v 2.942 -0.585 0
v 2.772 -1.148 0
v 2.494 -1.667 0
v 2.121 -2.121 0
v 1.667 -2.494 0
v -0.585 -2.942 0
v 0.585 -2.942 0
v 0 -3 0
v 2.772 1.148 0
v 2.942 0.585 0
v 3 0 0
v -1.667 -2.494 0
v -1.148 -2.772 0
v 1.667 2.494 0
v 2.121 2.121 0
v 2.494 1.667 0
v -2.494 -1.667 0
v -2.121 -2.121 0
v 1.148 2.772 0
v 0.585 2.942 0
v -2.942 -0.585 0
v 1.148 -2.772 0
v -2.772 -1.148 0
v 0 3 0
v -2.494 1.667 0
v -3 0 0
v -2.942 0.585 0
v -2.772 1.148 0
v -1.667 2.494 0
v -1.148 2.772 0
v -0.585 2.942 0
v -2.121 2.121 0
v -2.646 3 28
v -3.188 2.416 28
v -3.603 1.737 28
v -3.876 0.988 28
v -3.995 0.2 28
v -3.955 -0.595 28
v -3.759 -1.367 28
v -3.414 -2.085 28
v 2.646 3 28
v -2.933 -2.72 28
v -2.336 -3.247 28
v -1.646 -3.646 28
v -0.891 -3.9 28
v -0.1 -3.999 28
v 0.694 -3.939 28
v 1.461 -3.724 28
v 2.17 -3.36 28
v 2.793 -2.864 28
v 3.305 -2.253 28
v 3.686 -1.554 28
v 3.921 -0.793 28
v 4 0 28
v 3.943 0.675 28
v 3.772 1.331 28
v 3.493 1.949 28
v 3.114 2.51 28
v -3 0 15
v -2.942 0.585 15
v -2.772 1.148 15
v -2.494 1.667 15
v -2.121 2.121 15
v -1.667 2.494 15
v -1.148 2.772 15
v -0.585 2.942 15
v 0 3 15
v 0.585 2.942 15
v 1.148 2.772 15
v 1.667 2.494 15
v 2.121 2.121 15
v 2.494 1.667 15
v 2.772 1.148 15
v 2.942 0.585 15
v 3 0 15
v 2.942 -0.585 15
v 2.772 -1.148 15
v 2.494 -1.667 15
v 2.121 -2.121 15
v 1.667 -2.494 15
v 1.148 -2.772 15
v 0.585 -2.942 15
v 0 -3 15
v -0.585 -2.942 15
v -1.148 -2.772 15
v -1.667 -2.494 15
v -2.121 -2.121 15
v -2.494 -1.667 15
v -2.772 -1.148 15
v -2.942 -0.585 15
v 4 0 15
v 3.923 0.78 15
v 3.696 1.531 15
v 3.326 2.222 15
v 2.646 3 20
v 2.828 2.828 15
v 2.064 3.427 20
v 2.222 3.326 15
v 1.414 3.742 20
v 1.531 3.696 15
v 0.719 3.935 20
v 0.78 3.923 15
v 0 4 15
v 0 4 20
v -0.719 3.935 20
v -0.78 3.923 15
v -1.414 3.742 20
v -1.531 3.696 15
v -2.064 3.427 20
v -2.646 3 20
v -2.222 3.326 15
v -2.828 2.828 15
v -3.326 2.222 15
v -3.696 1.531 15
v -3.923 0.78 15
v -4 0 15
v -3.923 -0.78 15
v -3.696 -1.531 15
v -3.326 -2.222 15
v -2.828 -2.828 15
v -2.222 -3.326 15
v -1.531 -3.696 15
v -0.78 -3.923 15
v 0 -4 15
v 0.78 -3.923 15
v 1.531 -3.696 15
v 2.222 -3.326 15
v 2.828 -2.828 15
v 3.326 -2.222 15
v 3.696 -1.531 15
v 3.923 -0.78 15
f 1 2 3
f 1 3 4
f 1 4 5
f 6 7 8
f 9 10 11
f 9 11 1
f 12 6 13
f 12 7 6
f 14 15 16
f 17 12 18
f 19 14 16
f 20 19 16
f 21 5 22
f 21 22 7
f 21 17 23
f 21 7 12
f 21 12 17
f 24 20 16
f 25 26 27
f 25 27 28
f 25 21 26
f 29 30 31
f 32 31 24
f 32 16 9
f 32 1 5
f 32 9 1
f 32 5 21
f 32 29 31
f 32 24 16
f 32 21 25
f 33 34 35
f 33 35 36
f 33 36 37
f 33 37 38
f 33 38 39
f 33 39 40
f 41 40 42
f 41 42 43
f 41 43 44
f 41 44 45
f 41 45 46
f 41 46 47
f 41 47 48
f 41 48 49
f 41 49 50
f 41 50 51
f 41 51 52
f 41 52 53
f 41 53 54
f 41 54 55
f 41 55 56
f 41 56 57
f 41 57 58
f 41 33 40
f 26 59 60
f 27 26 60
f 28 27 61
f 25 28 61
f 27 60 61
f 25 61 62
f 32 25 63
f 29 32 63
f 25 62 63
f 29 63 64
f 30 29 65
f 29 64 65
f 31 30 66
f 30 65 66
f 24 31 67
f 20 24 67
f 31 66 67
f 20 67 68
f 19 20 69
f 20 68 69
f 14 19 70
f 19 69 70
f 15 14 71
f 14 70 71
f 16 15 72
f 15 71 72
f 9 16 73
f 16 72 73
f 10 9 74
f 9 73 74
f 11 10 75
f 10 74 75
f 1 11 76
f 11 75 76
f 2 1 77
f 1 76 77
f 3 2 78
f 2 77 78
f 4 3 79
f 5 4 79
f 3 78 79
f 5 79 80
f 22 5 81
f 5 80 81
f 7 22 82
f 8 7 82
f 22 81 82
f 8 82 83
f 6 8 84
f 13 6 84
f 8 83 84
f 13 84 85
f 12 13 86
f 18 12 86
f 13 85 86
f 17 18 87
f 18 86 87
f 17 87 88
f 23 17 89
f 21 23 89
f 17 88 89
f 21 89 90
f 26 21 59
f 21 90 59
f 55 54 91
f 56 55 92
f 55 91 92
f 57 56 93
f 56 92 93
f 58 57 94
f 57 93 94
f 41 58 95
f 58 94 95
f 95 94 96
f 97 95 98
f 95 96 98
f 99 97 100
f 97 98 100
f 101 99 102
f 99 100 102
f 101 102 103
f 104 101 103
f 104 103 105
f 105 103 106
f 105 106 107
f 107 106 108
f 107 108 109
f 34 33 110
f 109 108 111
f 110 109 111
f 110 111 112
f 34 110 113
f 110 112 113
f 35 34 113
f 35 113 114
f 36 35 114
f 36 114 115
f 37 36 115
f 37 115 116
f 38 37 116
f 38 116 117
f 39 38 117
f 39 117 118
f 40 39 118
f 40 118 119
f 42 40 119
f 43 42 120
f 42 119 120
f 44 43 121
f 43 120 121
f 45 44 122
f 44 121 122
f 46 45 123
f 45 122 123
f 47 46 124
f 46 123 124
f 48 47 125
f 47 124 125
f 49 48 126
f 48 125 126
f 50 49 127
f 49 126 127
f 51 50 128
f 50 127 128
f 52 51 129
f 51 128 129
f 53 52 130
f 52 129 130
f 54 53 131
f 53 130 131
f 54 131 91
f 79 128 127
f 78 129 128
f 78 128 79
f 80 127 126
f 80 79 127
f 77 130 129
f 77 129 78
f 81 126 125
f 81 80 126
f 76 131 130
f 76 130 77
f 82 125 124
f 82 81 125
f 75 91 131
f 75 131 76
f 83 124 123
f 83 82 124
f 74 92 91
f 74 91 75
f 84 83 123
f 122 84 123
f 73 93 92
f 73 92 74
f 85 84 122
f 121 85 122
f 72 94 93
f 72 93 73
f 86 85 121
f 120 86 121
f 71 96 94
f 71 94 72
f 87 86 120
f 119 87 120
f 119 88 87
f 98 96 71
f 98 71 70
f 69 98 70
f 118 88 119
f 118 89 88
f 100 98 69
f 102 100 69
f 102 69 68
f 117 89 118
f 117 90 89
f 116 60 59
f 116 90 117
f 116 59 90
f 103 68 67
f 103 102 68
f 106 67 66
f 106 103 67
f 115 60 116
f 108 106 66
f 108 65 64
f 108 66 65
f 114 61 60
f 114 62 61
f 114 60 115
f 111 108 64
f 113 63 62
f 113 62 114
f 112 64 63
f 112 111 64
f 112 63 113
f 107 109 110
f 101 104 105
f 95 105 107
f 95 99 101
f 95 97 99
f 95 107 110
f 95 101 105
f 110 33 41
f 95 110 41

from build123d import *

# Parameters (mm, degrees)
SKETCH_1_R          = 4
EXTRUDE_1_DEPTH     = 28
SKETCH_2_W          = 11.268608601
SKETCH_2_H          = 1.937161227
CUT_EXTRUDE_1_DEPTH = 15
SKETCH_3_W          = 8.764473356
SKETCH_3_H          = 2.433263492
CUT_EXTRUDE_2_DEPTH = 8
SKETCH_4_R          = 4.002706421
CUT_EXTRUDE_3_DEPTH = 15
SKETCH_5_R          = 3
EXTRUDE_2_DEPTH     = 15


with BuildPart() as part:
    # 스케치1 → 보스-돌출1 (new body)
    with BuildSketch(Plane.XY):
        Circle(SKETCH_1_R)
    extrude(amount=EXTRUDE_1_DEPTH)

    # 스케치2 → 컷-돌출1 (cut)
    with BuildSketch(Plane(origin=(0, 0, 0), x_dir=(-1, 0, 0), z_dir=(0, 0, -1))):
        with Locations((0.295298967, 3.968580614)):
            Rectangle(SKETCH_2_W, SKETCH_2_H)
    extrude(amount=-CUT_EXTRUDE_1_DEPTH, mode=Mode.SUBTRACT)

    # 스케치3 → 컷-돌출2 (cut)
    with BuildSketch(Plane.XY.offset(28)):
        with Locations((0.244916085, 4.216631746)):
            Rectangle(SKETCH_3_W, SKETCH_3_H)
    extrude(amount=-CUT_EXTRUDE_2_DEPTH, mode=Mode.SUBTRACT)

    # 스케치4 → 컷-돌출3 (cut)
    with BuildSketch(Plane(origin=(0, 0, 0), x_dir=(-1, 0, 0), z_dir=(0, 0, -1))):
        Circle(SKETCH_4_R)
    extrude(amount=-CUT_EXTRUDE_3_DEPTH, mode=Mode.SUBTRACT)

    # 스케치5 → 보스-돌출2 (add)
    with BuildSketch(Plane(origin=(0, 0, 15), x_dir=(-1, 0, 0), z_dir=(0, 0, -1))):
        Circle(SKETCH_5_R)
    extrude(amount=EXTRUDE_2_DEPTH)


solid = part.part
